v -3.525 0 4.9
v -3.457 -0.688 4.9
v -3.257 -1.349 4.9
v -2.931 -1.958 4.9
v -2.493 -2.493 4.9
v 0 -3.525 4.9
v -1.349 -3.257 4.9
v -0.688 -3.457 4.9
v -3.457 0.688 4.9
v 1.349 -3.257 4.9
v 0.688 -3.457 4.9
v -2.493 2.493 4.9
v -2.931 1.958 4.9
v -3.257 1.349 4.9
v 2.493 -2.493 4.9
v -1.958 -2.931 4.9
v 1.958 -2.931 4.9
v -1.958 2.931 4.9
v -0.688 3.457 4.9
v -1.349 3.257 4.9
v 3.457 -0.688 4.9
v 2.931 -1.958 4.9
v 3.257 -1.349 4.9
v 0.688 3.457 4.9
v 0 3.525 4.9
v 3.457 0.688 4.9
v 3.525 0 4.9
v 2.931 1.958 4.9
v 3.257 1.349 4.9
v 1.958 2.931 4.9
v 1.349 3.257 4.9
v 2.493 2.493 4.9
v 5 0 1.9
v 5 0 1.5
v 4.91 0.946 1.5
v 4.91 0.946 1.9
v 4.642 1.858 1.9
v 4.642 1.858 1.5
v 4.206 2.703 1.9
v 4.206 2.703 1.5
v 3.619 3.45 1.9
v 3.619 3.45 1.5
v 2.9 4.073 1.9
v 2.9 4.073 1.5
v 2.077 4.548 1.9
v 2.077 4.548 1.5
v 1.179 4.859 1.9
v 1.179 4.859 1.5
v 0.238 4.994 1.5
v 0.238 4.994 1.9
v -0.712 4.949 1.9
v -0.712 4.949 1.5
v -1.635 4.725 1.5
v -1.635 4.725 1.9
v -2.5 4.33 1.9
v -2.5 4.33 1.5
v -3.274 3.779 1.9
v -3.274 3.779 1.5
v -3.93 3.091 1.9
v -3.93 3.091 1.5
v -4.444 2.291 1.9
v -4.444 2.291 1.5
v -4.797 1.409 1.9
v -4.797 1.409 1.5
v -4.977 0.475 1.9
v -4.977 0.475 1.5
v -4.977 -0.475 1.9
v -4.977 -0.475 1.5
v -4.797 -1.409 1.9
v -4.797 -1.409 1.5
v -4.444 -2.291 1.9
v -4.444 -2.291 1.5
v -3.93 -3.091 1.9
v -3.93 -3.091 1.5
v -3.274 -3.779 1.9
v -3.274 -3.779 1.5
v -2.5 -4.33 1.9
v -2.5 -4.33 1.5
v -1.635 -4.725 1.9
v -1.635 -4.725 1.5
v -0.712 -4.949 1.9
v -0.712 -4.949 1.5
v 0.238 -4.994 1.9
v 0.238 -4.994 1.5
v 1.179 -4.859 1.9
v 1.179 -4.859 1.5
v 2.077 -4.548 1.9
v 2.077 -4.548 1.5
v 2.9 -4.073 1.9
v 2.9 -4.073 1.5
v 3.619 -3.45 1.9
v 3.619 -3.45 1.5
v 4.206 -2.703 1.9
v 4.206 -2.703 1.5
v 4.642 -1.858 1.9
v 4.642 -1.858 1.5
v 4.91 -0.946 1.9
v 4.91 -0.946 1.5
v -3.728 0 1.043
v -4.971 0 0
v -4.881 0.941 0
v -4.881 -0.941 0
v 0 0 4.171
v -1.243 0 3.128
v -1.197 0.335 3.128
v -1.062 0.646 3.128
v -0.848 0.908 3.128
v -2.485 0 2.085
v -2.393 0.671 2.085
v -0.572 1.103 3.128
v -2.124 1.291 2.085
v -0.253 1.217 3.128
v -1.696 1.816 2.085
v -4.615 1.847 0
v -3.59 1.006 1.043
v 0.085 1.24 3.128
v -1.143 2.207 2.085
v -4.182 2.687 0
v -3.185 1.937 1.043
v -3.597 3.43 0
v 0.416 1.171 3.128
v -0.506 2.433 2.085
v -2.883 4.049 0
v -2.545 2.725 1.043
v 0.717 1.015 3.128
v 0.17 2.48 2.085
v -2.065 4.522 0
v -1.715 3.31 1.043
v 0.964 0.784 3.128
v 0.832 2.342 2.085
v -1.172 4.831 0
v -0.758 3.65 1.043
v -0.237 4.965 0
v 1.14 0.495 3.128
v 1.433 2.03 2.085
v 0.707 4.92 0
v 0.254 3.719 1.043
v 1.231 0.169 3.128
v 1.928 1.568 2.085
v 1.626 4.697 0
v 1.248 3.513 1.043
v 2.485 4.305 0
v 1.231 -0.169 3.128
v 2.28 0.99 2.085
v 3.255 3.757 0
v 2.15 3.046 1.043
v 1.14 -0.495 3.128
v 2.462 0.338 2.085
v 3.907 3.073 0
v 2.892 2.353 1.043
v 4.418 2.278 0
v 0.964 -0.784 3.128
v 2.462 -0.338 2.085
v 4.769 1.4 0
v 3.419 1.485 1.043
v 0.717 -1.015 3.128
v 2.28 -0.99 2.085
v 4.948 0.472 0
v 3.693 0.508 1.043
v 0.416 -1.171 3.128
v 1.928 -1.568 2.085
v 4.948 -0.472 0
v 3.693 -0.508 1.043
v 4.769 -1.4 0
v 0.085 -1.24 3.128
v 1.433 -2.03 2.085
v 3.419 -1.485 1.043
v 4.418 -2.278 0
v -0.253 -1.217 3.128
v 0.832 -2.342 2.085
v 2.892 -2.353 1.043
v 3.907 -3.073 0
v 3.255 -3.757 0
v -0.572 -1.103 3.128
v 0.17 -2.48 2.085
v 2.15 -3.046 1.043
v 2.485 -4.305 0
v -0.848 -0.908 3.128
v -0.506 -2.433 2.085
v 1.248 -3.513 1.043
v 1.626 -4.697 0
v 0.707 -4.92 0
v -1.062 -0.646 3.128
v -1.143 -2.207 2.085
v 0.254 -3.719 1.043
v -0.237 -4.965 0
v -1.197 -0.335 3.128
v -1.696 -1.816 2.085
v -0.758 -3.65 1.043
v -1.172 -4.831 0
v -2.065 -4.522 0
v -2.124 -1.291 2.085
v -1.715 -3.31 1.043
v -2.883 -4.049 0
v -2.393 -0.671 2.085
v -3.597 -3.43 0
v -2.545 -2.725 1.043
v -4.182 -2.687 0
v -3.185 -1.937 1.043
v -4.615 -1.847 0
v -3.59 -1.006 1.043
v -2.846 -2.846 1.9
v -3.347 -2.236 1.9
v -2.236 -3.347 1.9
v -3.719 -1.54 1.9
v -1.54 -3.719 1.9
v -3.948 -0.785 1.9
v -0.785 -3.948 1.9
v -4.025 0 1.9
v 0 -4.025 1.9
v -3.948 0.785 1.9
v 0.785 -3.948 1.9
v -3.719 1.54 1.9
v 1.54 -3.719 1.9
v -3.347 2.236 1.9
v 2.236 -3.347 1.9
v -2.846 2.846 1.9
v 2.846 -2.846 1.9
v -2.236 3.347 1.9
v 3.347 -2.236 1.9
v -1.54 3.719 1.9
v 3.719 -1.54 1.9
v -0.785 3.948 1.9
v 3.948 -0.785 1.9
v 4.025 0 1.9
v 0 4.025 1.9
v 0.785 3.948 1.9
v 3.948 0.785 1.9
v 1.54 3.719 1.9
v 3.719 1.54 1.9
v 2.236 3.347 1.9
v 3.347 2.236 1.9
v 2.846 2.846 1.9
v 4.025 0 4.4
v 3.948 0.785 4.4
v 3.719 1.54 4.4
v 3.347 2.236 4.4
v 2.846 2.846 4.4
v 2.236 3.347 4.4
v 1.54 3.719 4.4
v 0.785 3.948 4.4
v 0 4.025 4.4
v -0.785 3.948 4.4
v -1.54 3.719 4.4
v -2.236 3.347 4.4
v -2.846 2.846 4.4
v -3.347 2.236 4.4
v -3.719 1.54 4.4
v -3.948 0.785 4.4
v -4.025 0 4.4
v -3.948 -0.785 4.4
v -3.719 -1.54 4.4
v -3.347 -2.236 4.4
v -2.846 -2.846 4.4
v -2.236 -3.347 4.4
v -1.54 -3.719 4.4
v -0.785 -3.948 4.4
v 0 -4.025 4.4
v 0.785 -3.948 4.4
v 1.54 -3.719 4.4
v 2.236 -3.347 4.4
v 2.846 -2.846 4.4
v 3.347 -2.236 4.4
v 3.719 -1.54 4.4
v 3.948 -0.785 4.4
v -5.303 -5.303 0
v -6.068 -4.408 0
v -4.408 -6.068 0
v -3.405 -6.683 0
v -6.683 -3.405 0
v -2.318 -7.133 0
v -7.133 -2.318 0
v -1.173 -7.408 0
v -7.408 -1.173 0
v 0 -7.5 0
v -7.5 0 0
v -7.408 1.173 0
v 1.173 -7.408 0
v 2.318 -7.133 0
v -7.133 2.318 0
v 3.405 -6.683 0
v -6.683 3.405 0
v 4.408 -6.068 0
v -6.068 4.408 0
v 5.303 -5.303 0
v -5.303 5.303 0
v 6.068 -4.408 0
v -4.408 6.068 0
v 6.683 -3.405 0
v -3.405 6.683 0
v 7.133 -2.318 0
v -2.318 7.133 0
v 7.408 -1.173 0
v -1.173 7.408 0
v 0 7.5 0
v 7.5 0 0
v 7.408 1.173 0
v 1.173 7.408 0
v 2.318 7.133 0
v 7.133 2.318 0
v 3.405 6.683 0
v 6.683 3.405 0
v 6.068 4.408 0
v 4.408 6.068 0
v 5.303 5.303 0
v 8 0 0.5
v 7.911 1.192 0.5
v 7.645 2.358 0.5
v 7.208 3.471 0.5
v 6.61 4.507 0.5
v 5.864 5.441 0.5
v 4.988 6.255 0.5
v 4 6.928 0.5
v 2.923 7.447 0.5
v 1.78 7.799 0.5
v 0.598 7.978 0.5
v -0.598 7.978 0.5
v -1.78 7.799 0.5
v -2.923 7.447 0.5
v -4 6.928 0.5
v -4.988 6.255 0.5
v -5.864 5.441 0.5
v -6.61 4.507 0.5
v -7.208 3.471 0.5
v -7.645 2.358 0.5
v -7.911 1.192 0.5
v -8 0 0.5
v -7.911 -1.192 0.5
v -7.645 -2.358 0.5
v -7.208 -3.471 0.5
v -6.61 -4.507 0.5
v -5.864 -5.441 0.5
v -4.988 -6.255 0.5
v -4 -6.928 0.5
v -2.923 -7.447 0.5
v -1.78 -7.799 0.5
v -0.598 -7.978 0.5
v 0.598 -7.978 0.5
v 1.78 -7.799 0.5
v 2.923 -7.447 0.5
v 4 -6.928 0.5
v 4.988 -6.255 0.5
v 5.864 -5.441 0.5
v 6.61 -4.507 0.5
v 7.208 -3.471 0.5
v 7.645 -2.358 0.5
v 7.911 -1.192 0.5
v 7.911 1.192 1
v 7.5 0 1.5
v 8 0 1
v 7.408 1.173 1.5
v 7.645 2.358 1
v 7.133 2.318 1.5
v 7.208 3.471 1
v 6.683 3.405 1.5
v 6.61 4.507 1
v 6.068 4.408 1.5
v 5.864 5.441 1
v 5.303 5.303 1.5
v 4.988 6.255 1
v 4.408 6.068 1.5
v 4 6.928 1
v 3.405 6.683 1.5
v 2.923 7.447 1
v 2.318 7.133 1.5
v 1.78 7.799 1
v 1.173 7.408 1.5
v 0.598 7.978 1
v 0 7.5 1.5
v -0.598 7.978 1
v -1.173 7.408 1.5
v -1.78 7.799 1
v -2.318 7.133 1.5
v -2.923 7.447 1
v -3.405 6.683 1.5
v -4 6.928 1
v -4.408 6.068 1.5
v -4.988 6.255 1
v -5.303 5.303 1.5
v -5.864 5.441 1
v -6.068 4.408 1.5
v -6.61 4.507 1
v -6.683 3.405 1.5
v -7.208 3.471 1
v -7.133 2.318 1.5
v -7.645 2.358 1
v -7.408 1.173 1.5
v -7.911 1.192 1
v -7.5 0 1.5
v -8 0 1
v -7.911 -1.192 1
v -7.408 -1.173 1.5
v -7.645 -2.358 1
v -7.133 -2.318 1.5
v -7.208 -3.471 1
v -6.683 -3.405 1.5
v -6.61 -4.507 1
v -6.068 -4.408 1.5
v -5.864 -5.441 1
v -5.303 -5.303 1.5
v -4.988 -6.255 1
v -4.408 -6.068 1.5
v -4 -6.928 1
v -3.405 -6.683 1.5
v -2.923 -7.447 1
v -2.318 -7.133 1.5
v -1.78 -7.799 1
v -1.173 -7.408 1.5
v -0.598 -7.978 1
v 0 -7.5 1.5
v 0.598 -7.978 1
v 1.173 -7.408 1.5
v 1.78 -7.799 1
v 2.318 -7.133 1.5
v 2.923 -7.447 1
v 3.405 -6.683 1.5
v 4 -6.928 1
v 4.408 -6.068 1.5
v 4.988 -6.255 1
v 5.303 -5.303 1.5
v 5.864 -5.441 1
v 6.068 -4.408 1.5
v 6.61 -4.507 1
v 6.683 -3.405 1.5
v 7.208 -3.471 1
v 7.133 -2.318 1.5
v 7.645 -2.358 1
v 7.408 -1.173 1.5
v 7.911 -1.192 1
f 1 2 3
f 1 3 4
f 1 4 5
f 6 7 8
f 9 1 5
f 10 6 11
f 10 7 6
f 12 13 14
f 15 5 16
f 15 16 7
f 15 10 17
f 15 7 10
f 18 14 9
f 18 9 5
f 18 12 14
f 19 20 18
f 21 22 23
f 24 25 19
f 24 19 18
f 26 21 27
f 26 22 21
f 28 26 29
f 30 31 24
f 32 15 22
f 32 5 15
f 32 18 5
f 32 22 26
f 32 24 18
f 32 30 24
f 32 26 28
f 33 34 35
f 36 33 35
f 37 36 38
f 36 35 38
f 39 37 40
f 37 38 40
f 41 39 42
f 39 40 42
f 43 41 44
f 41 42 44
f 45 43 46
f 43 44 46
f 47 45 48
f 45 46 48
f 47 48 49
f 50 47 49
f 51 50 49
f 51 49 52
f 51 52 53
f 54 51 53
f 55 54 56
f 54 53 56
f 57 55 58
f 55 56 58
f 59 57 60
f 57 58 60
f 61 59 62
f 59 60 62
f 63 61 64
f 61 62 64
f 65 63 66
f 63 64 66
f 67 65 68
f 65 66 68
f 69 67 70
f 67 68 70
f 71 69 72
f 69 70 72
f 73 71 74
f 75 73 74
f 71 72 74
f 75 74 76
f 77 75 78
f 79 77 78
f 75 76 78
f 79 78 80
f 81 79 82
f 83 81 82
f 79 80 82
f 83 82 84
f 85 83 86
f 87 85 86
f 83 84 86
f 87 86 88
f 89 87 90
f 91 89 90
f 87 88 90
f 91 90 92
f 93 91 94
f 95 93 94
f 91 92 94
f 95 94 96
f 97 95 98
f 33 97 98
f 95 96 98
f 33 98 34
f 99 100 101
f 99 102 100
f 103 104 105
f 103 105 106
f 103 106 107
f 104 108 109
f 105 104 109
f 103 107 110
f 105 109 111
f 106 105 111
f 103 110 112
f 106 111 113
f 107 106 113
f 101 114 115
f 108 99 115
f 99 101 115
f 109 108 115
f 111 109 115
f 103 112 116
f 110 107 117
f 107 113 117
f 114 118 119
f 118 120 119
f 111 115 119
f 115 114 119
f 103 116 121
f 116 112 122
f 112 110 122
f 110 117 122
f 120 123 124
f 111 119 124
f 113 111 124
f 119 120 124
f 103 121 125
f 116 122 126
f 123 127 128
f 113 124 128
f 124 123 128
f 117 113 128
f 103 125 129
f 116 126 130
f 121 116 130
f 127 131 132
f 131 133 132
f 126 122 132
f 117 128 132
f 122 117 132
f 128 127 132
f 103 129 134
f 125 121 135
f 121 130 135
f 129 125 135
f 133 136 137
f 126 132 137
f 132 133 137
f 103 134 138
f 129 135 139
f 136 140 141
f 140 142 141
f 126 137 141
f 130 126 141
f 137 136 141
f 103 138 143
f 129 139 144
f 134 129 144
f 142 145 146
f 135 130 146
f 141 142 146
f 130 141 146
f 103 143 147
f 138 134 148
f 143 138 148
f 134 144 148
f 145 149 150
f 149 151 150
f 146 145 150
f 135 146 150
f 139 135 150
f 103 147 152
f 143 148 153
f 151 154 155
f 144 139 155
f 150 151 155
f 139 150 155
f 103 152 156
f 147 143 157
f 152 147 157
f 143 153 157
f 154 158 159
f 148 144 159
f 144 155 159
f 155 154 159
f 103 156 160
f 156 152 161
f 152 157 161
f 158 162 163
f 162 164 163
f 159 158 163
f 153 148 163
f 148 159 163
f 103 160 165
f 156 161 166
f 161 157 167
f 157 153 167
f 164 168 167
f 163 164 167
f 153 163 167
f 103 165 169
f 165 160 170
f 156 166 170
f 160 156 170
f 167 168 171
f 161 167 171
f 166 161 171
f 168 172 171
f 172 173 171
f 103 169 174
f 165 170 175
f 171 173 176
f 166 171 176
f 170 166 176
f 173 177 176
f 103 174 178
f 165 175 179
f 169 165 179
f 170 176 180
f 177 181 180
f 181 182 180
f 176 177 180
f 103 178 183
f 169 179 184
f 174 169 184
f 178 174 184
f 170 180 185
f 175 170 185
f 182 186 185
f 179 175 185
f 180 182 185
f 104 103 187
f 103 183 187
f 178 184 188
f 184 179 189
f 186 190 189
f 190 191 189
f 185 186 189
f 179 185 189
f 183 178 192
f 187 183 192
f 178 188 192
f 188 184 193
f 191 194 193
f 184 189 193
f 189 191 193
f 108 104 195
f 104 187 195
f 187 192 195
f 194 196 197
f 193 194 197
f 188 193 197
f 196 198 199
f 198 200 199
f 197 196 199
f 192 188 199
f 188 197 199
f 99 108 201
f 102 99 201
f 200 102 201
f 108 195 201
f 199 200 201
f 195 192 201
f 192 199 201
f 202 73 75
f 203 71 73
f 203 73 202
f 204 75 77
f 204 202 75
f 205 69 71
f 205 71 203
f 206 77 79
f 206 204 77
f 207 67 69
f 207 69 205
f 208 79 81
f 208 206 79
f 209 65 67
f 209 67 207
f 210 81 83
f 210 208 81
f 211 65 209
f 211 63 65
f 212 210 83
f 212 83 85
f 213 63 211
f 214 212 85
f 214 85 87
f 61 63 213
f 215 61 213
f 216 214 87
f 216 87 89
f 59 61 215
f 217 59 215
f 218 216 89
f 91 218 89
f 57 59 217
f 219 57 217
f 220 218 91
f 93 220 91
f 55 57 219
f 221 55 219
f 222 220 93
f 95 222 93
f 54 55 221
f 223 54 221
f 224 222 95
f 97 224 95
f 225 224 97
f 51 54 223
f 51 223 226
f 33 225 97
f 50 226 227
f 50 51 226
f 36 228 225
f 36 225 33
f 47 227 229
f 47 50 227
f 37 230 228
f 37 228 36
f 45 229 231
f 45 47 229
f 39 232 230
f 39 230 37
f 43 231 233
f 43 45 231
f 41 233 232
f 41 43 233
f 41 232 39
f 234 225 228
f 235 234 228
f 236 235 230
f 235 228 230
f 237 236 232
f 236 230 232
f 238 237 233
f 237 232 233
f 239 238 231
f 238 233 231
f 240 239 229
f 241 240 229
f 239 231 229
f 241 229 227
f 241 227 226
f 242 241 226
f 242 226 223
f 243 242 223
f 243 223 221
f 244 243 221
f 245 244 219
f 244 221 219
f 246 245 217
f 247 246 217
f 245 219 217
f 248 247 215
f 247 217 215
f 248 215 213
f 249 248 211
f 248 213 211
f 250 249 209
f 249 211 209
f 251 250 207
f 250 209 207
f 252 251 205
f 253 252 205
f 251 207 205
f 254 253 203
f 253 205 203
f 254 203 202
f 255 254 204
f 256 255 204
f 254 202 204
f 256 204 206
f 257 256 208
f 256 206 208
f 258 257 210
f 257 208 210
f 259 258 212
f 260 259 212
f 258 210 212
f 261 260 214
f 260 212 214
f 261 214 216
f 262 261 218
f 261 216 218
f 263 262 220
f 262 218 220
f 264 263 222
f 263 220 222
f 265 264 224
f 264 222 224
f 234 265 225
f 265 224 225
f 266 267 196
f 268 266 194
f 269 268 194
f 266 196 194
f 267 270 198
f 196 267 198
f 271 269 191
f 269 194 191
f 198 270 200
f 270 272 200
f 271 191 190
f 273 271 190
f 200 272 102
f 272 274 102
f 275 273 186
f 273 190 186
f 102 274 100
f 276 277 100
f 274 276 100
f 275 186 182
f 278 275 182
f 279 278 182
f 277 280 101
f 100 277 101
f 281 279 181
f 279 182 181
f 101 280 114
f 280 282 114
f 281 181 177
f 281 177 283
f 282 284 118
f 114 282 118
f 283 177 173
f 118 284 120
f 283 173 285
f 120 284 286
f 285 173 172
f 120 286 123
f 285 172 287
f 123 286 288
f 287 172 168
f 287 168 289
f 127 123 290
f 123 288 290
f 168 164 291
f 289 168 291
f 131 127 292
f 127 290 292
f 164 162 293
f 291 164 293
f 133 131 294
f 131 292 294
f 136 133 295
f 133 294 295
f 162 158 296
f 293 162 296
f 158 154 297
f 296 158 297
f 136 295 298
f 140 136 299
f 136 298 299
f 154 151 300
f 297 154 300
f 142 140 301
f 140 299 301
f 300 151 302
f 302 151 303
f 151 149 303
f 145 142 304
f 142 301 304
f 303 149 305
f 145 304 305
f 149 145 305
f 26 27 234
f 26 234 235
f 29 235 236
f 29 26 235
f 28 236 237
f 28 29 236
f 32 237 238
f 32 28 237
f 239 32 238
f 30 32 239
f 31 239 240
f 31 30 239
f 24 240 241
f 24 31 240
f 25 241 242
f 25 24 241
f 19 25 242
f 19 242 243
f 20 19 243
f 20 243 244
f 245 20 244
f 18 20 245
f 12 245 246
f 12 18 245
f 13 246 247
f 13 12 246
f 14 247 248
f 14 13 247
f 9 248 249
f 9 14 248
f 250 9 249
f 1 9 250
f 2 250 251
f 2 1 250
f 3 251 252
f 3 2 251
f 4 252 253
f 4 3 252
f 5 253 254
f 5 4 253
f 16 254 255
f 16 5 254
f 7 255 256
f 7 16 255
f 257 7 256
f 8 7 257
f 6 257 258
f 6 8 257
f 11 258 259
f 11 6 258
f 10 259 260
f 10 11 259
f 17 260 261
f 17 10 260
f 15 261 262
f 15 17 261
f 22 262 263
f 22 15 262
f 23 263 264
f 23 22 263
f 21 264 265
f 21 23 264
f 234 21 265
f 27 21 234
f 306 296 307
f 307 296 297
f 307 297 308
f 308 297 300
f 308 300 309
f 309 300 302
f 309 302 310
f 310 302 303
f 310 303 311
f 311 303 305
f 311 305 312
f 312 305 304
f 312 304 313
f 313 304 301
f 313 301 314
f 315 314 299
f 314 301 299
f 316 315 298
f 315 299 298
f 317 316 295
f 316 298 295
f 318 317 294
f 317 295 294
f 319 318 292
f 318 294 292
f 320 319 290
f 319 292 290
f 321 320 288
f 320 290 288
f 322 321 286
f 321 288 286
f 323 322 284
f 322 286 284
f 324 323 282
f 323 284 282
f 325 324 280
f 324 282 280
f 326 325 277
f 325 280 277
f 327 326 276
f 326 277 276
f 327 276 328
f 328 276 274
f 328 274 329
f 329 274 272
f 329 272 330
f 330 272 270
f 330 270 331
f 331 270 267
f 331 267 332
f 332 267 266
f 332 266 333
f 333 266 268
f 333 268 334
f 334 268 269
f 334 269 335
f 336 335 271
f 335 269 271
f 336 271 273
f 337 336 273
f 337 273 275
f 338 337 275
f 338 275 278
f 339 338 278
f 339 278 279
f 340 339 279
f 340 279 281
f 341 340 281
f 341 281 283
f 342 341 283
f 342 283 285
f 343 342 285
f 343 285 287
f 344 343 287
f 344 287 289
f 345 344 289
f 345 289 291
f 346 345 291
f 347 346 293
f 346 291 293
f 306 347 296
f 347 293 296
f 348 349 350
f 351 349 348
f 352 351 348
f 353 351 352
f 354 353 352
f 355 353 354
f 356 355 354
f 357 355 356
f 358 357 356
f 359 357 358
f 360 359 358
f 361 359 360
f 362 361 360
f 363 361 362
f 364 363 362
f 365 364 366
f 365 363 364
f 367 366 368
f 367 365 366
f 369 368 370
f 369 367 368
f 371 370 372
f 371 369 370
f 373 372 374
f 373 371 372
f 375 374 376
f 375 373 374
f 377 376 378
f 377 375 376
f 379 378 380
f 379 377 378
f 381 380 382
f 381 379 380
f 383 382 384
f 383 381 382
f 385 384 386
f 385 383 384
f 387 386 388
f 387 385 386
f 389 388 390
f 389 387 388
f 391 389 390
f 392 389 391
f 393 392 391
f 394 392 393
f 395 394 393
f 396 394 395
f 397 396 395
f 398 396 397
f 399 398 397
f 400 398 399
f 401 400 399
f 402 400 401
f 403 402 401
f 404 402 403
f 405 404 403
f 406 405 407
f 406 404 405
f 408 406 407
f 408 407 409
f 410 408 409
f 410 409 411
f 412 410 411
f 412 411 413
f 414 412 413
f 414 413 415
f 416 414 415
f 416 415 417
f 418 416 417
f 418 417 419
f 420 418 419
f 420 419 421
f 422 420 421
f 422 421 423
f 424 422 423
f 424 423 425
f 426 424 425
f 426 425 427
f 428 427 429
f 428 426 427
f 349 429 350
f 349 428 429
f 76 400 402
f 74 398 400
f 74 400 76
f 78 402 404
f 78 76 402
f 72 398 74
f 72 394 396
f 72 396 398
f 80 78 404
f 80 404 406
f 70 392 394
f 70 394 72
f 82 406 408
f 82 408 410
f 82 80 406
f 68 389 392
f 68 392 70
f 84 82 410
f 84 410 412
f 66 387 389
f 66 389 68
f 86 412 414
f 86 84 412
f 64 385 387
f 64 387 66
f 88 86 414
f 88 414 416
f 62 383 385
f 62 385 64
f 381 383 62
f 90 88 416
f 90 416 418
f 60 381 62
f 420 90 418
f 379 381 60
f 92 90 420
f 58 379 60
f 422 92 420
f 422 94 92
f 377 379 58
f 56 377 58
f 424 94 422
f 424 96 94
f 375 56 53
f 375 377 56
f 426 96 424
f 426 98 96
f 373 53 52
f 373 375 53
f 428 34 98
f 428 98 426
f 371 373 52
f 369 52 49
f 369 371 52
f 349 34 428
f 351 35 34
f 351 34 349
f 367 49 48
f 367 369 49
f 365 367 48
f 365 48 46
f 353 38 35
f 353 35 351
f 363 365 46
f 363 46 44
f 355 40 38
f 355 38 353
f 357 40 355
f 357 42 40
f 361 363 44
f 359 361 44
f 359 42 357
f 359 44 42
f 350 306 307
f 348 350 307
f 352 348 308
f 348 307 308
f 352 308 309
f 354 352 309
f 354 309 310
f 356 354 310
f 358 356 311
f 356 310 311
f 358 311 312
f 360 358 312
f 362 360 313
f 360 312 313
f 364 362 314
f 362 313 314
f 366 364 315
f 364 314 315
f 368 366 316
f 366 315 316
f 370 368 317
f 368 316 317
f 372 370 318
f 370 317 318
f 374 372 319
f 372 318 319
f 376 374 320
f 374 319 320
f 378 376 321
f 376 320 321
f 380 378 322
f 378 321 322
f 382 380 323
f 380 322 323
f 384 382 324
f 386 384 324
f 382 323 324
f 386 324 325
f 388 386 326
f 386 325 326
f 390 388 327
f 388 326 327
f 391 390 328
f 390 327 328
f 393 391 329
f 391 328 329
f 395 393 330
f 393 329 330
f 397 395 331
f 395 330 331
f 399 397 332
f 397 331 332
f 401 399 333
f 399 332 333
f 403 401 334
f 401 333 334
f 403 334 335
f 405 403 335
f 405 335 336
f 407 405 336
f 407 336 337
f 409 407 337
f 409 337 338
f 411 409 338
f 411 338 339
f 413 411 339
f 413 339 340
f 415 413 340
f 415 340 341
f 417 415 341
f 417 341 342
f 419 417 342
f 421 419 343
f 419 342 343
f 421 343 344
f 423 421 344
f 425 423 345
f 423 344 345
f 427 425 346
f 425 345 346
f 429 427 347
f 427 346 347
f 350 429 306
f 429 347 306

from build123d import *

# Parameters (mm, degrees)
F0_R     = 8
F1_DEPTH = 1.5
F2_R     = 5
F3_DEPTH = 0.4
F4_R     = 4.025
F5_DEPTH = 3
F6_SIZE  = 0.5


with BuildPart() as f1:
    # F0 (on Top) → F1 (new body)
    with BuildSketch(Plane.XY):
        Circle(F0_R)
    extrude(amount=F1_DEPTH)

    # F2 (on face) → F3 (join)
    with BuildSketch(Plane.XY.offset(1.5)):
        Circle(F2_R)
    extrude(amount=F3_DEPTH)

    # F4 (on face) → F5 (join)
    with BuildSketch(Plane.XY.offset(1.9)):
        Circle(F4_R)
    extrude(amount=F5_DEPTH)

    # F6
    f6_edges = [f1.edges().sort_by_distance(p)[0] for p in [
        (-8, 0, 0),
        (-8, 0, 1.5),
        (-4.025, 0, 4.9),
    ]]
    chamfer(f6_edges, length=F6_SIZE)

    # F7 (on Front) → F8 (revolve, cut)
    with BuildSketch(Plane.XZ):
        Polygon((0, 4.170951), (-4.970746, 0), (0, 0), align=None)
    revolve(axis=Axis((0, 0, 2.085476), (0, 0, -1)), mode=Mode.SUBTRACT)


solid = f1.part
